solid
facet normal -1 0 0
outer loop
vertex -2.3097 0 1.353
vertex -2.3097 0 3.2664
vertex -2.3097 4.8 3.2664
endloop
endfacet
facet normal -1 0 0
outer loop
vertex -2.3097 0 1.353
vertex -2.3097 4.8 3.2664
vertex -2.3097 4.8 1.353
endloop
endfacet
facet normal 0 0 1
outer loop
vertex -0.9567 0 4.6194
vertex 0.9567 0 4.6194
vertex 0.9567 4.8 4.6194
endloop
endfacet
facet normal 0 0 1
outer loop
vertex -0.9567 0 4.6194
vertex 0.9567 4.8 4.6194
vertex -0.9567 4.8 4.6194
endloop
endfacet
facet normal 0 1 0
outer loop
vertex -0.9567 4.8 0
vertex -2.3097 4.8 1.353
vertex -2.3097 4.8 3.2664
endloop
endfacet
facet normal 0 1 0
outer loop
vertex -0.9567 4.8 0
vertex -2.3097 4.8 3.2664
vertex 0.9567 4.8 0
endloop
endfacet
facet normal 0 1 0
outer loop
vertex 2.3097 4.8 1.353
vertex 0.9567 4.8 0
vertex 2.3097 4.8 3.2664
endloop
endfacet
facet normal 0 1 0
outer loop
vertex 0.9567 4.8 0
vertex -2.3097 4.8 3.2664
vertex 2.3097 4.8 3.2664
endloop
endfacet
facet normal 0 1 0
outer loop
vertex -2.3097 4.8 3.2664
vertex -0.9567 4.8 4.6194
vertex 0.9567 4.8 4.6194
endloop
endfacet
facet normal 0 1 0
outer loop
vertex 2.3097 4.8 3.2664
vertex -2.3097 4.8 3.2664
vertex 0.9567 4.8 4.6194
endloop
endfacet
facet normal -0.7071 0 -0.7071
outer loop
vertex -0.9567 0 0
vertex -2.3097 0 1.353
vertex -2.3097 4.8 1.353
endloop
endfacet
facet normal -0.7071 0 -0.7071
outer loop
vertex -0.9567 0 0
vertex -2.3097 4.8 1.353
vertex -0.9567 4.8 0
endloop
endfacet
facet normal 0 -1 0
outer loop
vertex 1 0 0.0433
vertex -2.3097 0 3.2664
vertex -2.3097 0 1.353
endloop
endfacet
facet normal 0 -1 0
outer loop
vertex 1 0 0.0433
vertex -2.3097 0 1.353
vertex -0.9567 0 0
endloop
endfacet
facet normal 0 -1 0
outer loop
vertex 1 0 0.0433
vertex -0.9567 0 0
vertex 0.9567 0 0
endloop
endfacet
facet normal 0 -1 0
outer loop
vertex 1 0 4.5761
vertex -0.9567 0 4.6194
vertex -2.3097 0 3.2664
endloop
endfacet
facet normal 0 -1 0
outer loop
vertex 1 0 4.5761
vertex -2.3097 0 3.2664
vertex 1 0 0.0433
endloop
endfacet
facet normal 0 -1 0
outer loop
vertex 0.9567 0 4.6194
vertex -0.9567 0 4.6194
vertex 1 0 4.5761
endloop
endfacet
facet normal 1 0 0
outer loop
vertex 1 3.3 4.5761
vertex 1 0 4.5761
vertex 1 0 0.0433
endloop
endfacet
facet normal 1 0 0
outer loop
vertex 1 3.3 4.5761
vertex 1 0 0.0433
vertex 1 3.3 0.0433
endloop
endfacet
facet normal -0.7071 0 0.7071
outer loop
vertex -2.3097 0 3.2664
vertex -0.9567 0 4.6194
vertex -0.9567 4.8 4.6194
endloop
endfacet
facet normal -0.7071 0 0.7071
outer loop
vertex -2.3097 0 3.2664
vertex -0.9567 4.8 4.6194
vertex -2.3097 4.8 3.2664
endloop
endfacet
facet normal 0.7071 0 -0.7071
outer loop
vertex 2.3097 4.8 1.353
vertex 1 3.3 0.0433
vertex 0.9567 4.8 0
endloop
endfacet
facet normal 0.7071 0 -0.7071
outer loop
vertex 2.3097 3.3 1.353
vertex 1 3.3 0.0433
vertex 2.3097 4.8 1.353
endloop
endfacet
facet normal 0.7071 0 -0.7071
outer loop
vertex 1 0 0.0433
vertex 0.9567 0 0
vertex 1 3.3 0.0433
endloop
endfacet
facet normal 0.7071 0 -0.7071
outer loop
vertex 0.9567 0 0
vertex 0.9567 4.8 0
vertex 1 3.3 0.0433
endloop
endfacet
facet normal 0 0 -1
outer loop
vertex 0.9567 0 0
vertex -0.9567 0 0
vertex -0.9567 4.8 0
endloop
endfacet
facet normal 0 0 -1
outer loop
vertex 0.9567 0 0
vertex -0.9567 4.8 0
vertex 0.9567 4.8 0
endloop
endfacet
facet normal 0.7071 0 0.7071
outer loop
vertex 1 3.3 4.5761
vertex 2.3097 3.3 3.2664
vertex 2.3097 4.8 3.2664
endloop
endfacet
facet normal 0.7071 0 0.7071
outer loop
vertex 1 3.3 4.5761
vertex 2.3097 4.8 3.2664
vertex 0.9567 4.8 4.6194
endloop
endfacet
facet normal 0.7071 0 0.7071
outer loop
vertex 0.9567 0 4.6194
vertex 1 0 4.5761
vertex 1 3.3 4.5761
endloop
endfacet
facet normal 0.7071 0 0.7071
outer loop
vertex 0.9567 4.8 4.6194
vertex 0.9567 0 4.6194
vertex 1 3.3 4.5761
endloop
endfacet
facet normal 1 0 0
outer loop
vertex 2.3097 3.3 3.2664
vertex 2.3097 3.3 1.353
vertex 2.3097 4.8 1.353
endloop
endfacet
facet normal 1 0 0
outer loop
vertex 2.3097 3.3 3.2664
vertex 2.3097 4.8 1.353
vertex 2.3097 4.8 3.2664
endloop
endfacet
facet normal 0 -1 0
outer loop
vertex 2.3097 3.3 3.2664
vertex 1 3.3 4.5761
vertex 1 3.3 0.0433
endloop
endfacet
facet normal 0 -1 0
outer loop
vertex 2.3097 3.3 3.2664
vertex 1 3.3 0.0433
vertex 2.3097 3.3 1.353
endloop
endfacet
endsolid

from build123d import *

# Parameters (mm, degrees)
BOX008_W         = 2
BOX008_H         = 3.3
BOX008_DEPTH     = 6
EXTRUDE004_DEPTH = 4.8


with BuildPart() as box008:
    # Box008 → Box008 (new body)
    with BuildSketch(Plane(origin=(1, 0, -0.5), x_dir=(1, 0, 0), z_dir=(0, 0, 1))):
        with Locations((1, 1.65)):
            Rectangle(BOX008_W, BOX008_H)
    extrude(amount=BOX008_DEPTH)


with BuildPart() as octpin_wnotch:
    # Sketch002 → Extrude004 (new body)
    with BuildSketch(Plane.XZ):
        Polygon((2.309699, 1.35299), (2.309699, 3.266407), (0.956709, 4.619398), (-0.956709, 4.619398), (-2.309699, 3.266407), (-2.309699, 1.35299), (-0.956709, 0), (0.956709, 0), align=None)
    extrude(amount=-EXTRUDE004_DEPTH)

    # Cut: cut Box008
    add(box008.part, mode=Mode.SUBTRACT)


solid = octpin_wnotch.part
